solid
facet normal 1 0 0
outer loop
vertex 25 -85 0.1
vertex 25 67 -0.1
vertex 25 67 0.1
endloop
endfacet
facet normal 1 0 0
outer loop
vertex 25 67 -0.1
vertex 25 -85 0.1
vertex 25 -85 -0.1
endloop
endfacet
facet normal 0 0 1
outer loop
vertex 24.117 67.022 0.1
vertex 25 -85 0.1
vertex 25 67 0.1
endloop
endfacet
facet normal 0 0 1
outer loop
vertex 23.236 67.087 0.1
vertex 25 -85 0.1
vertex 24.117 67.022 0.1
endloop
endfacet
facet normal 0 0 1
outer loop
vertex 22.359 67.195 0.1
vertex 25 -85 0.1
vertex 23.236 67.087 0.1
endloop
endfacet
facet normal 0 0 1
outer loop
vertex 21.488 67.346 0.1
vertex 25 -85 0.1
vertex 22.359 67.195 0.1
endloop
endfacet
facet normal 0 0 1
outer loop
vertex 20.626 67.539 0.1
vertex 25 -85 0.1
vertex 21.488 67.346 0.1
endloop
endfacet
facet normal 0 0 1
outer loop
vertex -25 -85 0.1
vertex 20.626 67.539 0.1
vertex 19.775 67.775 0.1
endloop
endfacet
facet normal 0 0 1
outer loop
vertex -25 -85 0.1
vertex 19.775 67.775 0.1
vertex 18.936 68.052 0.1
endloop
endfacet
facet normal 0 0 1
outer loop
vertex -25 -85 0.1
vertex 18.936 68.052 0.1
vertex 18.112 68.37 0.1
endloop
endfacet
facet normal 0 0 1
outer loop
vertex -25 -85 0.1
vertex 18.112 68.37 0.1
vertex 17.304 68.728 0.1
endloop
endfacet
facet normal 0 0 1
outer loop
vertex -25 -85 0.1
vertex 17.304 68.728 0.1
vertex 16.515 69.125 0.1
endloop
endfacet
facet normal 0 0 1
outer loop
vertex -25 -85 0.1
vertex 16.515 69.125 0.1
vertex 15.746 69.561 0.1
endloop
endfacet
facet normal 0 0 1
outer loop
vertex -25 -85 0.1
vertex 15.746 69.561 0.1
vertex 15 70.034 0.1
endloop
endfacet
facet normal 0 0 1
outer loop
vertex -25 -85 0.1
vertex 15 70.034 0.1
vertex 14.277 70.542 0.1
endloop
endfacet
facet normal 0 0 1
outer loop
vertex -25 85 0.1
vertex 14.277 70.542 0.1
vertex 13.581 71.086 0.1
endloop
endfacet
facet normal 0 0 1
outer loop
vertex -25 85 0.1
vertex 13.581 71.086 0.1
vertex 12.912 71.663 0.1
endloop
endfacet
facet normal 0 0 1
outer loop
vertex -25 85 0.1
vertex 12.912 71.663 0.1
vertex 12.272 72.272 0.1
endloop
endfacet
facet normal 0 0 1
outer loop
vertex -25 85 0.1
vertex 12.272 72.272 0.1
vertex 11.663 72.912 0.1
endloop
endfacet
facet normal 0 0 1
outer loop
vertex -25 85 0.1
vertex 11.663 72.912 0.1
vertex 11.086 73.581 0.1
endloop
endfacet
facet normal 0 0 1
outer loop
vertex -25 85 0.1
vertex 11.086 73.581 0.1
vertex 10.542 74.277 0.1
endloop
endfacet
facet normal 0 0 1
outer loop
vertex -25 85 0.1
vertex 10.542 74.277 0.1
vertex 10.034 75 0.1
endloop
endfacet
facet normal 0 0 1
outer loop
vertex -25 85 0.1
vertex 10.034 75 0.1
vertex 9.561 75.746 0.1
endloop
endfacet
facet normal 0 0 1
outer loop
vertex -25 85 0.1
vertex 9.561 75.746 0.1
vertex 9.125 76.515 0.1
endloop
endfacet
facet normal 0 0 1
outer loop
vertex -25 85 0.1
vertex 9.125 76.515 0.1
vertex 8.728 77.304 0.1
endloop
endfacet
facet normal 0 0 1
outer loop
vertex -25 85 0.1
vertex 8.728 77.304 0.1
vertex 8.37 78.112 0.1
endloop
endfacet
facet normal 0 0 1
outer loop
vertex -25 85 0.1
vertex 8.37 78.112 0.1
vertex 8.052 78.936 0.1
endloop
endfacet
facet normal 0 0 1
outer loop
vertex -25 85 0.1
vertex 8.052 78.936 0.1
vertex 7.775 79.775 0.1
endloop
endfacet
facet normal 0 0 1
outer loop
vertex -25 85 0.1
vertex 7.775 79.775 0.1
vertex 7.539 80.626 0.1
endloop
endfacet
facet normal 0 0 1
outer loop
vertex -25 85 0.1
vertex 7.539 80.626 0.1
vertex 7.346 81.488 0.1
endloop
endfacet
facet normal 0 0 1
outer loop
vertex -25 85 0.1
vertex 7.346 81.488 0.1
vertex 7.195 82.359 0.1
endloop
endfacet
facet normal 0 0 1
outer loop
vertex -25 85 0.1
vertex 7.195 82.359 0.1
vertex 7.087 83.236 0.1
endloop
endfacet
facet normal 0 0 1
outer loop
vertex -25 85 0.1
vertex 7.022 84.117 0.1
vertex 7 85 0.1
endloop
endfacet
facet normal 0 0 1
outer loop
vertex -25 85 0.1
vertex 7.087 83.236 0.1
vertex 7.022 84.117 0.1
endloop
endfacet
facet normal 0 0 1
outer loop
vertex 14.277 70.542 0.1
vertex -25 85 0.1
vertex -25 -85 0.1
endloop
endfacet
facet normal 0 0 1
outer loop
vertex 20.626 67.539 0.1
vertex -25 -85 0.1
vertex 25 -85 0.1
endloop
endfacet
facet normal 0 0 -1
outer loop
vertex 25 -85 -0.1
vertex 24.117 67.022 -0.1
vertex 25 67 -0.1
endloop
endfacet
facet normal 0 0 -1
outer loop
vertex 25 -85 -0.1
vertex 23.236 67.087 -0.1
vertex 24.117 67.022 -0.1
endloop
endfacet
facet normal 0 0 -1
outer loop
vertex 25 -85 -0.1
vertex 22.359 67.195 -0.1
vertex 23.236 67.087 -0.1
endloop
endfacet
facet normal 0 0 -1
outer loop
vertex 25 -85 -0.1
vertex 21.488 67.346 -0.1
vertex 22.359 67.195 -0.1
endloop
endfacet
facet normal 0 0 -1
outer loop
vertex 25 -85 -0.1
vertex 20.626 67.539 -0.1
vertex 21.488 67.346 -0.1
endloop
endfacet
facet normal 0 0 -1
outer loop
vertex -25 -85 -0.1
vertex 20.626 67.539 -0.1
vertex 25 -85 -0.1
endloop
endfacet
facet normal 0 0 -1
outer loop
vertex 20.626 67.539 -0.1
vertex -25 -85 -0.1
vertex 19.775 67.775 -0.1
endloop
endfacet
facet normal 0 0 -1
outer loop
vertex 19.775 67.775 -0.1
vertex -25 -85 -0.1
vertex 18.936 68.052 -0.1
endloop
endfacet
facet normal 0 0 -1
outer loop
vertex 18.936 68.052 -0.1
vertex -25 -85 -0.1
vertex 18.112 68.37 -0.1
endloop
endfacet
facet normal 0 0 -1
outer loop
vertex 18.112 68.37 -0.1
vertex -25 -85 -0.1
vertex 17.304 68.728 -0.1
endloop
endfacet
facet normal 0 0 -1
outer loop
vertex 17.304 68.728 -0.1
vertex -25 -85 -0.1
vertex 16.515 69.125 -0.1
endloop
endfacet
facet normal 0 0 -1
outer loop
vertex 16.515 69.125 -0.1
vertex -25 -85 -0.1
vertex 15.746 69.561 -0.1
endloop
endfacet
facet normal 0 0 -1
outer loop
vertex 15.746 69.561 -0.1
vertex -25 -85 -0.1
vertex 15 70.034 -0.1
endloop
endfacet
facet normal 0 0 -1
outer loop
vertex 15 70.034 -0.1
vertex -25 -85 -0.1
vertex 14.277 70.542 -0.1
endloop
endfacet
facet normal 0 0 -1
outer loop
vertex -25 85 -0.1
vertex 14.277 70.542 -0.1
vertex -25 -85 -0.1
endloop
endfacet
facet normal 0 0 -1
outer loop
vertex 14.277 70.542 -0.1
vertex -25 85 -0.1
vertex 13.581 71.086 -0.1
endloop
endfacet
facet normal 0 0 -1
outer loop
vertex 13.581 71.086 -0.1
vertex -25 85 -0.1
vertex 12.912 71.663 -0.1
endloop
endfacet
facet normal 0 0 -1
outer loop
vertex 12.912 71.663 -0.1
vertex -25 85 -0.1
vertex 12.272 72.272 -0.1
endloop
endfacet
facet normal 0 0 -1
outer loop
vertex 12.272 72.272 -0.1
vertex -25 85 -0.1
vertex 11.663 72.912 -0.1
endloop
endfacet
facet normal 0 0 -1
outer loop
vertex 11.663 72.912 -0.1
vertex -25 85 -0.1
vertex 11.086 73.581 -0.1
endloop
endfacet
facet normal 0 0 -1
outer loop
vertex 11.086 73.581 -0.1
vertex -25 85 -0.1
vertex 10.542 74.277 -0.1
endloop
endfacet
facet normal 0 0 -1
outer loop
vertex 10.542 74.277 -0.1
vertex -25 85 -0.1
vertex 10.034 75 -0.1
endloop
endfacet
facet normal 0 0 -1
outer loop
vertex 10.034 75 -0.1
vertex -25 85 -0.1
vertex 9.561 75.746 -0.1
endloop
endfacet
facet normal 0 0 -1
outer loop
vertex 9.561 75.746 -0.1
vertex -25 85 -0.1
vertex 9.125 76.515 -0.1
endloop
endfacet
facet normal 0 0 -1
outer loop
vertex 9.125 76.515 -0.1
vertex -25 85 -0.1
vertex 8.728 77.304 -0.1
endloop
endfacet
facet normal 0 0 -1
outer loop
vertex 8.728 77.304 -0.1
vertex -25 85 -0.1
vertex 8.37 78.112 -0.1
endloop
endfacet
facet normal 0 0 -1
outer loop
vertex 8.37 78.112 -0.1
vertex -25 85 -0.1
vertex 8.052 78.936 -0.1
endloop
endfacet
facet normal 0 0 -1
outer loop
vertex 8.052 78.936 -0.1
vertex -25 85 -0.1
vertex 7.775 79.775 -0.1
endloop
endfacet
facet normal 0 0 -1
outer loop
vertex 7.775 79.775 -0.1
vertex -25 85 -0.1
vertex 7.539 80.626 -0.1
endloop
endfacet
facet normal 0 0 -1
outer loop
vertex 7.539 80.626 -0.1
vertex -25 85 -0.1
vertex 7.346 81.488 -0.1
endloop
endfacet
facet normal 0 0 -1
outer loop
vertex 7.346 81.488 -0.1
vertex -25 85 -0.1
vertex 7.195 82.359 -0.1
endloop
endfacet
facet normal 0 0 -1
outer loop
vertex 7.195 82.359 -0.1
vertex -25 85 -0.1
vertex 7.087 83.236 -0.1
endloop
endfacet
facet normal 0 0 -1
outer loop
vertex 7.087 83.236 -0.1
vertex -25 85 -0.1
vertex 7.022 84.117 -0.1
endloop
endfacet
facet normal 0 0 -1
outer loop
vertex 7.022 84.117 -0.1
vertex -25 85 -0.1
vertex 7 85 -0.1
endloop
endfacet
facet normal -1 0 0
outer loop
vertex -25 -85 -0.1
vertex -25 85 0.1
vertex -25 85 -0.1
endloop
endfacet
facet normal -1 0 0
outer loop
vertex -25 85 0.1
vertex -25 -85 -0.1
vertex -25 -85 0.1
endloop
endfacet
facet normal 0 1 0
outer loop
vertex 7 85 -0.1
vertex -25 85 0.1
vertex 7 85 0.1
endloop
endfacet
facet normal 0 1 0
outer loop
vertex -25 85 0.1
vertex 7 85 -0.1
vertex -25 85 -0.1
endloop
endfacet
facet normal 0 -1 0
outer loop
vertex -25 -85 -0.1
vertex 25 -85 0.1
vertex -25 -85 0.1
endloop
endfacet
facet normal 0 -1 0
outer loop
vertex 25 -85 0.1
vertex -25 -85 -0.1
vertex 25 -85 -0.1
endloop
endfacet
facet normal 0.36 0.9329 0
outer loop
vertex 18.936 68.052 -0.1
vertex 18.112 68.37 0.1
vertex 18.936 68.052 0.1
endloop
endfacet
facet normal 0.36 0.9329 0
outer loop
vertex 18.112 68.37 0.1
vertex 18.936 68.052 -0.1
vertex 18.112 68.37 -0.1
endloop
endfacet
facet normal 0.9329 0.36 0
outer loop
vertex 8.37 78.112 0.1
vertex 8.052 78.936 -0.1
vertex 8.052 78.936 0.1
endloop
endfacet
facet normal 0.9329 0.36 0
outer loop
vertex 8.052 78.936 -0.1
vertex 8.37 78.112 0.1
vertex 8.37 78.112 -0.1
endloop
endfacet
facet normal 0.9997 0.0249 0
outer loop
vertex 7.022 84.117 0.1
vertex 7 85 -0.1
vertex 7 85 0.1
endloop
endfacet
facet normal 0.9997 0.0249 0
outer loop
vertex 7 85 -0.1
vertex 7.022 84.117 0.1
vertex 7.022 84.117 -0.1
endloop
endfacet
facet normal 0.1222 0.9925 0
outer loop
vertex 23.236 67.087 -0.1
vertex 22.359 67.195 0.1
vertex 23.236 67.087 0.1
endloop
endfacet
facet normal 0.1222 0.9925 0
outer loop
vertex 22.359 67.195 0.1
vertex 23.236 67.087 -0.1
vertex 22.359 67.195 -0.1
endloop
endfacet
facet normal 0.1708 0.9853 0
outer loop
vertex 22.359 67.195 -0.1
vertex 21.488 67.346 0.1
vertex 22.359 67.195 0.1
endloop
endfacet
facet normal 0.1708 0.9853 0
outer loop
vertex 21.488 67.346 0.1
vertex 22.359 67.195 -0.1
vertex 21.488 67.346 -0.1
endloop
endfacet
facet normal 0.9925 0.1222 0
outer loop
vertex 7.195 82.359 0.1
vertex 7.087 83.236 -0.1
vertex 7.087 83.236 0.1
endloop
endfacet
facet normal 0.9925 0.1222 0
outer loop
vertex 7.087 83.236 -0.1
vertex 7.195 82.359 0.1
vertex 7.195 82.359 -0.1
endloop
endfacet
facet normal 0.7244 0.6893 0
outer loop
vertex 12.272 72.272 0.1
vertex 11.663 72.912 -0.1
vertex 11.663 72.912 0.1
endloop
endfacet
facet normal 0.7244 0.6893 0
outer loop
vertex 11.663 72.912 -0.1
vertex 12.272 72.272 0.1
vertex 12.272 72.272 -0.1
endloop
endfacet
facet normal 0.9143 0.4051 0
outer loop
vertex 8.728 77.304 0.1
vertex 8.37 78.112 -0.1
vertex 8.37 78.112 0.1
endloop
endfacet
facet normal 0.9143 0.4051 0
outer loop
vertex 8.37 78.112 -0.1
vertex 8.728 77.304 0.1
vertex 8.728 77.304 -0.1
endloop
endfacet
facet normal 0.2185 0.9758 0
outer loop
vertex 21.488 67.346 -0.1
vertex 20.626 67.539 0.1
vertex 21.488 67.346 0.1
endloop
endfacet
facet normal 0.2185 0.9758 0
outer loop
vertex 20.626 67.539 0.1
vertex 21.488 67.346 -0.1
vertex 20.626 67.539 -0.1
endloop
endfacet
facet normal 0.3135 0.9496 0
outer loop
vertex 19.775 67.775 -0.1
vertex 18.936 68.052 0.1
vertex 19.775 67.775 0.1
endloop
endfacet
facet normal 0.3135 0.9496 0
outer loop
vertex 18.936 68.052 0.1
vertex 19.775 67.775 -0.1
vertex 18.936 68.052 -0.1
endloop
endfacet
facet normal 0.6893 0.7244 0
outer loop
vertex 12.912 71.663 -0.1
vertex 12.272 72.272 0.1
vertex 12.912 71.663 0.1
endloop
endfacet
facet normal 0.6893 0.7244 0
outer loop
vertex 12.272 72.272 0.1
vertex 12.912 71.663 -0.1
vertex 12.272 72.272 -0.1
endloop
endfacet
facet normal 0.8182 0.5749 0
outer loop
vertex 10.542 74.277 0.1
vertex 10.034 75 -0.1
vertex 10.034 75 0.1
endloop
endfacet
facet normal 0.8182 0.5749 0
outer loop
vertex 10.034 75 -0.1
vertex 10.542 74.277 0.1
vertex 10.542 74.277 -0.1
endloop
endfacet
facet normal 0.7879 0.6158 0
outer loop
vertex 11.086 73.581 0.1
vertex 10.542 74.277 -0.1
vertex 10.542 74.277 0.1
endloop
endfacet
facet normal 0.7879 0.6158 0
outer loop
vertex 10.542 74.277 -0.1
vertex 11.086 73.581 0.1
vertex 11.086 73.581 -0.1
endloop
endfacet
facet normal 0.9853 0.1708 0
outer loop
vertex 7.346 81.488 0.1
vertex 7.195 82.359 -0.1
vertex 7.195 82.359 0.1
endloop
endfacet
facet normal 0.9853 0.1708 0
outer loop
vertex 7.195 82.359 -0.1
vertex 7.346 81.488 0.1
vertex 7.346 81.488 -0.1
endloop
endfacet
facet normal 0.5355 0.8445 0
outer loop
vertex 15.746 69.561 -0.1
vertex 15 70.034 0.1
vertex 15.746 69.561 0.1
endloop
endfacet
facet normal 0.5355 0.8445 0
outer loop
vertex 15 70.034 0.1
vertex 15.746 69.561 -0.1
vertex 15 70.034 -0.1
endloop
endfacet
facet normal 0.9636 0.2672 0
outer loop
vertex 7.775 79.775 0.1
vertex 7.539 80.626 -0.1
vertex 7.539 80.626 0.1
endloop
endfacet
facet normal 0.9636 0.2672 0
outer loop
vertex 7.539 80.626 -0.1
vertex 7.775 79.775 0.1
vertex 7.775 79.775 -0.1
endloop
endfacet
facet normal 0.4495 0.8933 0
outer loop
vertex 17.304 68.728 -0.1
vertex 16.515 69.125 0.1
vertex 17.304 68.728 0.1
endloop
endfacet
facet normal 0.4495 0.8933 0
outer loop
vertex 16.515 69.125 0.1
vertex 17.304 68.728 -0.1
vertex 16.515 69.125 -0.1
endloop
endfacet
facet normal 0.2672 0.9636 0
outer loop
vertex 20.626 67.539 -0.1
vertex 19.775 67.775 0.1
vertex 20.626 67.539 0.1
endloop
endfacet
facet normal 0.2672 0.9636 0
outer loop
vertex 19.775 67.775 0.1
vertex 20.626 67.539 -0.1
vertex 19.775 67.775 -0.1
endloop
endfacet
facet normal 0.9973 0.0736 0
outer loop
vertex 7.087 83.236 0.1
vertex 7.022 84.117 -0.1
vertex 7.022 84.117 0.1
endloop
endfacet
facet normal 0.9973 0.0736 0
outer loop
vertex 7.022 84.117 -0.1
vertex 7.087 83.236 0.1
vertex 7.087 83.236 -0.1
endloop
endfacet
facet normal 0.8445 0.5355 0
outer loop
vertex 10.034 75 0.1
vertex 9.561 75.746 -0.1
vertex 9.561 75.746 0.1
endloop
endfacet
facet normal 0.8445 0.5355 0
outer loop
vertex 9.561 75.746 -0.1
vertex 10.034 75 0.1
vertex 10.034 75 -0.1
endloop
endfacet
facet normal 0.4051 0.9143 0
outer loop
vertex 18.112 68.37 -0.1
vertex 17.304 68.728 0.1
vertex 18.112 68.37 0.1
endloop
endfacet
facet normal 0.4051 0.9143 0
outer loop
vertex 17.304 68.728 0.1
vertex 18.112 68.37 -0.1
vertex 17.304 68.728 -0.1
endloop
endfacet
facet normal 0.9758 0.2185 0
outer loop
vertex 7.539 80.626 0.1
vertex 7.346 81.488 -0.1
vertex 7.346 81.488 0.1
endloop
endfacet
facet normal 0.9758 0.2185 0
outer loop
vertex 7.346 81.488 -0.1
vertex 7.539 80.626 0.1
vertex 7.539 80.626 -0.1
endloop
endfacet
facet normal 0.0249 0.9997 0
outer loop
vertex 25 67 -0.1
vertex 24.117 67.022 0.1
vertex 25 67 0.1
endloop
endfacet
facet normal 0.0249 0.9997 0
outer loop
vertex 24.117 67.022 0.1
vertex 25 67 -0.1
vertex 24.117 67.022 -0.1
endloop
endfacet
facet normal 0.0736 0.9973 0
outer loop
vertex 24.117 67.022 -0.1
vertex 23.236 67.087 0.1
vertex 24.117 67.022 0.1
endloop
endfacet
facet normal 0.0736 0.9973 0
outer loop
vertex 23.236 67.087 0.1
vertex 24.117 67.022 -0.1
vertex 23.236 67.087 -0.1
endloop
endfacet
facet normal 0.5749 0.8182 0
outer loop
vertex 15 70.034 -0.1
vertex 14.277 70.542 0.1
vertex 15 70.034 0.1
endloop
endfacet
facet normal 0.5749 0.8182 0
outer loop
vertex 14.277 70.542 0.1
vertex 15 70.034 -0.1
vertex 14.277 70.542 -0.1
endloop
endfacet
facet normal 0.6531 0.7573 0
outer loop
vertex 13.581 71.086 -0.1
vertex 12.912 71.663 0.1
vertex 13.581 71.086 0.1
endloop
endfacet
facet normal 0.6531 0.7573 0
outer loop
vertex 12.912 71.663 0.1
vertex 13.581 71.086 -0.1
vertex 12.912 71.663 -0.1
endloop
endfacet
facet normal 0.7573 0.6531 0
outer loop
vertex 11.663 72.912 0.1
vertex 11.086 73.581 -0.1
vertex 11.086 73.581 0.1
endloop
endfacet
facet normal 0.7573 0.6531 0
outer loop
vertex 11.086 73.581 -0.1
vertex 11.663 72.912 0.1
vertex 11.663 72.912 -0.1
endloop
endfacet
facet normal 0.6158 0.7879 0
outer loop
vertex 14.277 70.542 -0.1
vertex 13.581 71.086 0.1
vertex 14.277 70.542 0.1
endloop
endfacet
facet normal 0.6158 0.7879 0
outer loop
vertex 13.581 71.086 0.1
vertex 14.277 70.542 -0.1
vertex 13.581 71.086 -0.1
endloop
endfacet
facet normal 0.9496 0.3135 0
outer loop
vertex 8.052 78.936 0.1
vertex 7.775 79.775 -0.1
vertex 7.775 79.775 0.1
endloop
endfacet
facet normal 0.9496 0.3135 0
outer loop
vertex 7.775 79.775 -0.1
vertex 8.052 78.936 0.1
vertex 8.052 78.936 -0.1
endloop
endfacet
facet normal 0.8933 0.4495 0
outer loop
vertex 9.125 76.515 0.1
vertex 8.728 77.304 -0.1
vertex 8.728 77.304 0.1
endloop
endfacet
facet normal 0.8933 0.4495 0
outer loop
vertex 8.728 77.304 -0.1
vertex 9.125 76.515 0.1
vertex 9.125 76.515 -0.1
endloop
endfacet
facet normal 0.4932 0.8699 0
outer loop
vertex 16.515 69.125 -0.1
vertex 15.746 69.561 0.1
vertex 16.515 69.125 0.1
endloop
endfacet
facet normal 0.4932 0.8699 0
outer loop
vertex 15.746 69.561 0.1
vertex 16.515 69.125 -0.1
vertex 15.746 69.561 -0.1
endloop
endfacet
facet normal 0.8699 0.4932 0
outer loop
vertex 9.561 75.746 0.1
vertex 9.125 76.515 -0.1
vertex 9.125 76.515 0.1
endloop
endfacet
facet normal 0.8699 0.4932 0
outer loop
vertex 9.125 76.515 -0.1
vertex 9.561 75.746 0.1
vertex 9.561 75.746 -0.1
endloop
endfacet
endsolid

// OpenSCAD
$fn = 128; // Set the resolution of the model

layerHeight = 0.2;

height = layerHeight * 1;

width = 50;
depth = 170;

fillet = 18;

difference() {
    cube([width, depth, height], center = true);

    translate([(width / 2), (depth / 2), 0])
        cylinder(r=fillet, h= height, center = true);
}
